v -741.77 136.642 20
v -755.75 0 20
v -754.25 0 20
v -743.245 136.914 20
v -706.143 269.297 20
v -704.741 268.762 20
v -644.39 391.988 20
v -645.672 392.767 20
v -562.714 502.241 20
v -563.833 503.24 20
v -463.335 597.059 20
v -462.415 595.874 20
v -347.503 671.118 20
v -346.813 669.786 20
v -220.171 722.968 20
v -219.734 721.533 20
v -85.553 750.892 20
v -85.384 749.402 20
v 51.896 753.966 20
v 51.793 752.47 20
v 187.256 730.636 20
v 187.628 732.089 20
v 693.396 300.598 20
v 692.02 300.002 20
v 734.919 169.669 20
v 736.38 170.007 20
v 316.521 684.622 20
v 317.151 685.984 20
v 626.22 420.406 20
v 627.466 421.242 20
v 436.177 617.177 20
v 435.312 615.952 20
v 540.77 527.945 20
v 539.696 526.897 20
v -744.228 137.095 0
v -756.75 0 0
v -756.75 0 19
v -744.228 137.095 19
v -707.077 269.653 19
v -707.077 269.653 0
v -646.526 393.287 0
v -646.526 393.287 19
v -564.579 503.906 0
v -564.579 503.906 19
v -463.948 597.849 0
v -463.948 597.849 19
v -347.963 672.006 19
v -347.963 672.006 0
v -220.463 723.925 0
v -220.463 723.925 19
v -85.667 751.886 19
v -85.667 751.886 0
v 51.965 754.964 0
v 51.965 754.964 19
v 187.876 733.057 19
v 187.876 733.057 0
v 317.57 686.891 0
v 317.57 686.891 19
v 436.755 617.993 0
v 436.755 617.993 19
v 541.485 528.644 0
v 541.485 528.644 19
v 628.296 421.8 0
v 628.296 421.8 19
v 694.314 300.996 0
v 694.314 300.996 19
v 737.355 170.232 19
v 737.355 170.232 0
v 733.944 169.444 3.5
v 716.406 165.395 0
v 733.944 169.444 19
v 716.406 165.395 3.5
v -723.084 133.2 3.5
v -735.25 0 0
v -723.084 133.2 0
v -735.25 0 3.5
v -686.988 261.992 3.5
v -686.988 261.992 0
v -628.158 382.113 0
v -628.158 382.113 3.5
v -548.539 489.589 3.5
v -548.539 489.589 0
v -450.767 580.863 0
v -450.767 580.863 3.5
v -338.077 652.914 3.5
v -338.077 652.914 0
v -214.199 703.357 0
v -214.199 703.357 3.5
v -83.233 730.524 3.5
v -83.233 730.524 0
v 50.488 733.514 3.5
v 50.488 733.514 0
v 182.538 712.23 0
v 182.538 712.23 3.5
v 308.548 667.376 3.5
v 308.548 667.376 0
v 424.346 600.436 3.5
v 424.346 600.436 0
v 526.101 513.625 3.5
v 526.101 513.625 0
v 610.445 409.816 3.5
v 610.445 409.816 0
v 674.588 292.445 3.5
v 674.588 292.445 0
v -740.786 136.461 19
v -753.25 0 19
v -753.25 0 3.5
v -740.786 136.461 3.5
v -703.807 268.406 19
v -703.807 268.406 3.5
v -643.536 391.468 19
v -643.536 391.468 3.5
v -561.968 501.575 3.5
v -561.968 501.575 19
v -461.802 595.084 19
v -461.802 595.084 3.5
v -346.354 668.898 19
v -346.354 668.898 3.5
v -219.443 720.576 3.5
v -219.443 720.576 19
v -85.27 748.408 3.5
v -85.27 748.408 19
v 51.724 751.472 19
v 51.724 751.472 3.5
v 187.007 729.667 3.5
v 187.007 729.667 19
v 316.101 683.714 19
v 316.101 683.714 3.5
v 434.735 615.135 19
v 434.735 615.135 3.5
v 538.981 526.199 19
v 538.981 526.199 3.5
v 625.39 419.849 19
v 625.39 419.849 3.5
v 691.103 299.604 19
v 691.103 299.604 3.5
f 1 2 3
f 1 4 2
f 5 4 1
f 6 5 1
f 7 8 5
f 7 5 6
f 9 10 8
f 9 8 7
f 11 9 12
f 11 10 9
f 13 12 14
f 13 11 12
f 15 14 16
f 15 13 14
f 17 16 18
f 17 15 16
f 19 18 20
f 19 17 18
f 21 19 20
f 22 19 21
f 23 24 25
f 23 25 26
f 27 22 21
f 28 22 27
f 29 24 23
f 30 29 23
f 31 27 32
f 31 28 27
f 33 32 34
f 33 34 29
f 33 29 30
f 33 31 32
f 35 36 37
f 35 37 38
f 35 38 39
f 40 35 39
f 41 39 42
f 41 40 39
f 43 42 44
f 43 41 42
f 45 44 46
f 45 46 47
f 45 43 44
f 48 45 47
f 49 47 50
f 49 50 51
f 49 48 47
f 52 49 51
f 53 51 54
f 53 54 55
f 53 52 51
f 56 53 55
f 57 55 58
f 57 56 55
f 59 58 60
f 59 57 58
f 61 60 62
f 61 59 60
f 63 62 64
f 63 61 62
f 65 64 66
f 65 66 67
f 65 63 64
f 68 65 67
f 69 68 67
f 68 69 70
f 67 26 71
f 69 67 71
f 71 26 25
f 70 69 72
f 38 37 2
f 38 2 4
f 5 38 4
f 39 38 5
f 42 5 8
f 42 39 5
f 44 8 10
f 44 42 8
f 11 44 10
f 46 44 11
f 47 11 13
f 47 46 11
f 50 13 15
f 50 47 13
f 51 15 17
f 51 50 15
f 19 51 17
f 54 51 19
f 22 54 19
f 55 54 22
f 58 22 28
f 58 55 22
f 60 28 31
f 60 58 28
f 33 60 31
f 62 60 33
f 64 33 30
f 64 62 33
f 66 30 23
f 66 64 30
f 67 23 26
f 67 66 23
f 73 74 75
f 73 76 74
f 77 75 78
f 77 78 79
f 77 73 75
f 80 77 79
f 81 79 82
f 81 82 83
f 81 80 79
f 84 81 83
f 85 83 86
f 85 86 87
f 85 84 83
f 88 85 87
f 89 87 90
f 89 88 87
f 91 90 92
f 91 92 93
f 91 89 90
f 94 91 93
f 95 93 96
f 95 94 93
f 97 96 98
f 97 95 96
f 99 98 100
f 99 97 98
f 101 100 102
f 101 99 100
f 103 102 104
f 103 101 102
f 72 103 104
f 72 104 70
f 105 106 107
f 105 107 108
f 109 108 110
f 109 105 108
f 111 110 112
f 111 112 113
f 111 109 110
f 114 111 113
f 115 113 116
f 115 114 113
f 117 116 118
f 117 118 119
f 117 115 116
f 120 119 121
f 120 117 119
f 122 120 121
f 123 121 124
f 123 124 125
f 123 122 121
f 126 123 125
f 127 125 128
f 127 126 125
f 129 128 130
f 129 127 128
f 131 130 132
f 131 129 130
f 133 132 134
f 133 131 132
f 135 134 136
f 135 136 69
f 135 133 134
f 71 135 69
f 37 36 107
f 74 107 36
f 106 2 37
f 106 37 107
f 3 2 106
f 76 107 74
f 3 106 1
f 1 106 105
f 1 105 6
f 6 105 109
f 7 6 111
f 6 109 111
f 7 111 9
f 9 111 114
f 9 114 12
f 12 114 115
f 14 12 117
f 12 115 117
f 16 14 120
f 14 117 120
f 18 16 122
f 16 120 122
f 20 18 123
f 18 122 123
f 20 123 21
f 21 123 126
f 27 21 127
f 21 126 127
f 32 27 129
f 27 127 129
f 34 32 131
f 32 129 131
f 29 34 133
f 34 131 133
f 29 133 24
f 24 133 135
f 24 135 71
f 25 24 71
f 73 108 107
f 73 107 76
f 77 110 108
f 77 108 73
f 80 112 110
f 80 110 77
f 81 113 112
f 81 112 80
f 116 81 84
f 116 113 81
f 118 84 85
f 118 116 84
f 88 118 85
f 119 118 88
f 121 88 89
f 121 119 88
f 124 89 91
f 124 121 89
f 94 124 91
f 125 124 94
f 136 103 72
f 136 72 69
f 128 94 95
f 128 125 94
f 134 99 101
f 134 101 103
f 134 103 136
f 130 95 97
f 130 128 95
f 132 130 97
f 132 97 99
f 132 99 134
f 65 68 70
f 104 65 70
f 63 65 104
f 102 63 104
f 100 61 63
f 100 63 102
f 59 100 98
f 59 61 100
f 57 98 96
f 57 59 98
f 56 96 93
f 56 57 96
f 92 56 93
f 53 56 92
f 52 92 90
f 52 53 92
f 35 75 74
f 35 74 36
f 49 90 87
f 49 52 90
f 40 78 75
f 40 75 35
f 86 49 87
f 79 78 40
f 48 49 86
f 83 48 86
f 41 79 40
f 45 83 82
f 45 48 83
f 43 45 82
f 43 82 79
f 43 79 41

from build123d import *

# Parameters (mm, degrees)
F3_ANGLE = 167
F4_SIZE  = 1


# Not quite as in the source:
# - a feature names something its author has since deleted; it is built from what else it names


with BuildPart() as f3:
    # F2 (on Front) → F3 (revolve)
    with BuildSketch(Plane.XZ):
        Polygon((-753.25, 20), (-756.75, 20), (-756.75, 0), (-735.25, 0), (-735.25, 3.5), (-753.25, 3.5), align=None)
    revolve(axis=Axis((0, 0, 7.6849460602), (0, 0, -1)), revolution_arc=F3_ANGLE)

    # F4
    f4_edges = [f3.edges().sort_by_distance(p)[0] for p in [
        (-85.666532, 751.885502, 20),
        (-85.270321, 748.408, 20),
    ]]
    chamfer(f4_edges, length=F4_SIZE)


solid = f3.part
